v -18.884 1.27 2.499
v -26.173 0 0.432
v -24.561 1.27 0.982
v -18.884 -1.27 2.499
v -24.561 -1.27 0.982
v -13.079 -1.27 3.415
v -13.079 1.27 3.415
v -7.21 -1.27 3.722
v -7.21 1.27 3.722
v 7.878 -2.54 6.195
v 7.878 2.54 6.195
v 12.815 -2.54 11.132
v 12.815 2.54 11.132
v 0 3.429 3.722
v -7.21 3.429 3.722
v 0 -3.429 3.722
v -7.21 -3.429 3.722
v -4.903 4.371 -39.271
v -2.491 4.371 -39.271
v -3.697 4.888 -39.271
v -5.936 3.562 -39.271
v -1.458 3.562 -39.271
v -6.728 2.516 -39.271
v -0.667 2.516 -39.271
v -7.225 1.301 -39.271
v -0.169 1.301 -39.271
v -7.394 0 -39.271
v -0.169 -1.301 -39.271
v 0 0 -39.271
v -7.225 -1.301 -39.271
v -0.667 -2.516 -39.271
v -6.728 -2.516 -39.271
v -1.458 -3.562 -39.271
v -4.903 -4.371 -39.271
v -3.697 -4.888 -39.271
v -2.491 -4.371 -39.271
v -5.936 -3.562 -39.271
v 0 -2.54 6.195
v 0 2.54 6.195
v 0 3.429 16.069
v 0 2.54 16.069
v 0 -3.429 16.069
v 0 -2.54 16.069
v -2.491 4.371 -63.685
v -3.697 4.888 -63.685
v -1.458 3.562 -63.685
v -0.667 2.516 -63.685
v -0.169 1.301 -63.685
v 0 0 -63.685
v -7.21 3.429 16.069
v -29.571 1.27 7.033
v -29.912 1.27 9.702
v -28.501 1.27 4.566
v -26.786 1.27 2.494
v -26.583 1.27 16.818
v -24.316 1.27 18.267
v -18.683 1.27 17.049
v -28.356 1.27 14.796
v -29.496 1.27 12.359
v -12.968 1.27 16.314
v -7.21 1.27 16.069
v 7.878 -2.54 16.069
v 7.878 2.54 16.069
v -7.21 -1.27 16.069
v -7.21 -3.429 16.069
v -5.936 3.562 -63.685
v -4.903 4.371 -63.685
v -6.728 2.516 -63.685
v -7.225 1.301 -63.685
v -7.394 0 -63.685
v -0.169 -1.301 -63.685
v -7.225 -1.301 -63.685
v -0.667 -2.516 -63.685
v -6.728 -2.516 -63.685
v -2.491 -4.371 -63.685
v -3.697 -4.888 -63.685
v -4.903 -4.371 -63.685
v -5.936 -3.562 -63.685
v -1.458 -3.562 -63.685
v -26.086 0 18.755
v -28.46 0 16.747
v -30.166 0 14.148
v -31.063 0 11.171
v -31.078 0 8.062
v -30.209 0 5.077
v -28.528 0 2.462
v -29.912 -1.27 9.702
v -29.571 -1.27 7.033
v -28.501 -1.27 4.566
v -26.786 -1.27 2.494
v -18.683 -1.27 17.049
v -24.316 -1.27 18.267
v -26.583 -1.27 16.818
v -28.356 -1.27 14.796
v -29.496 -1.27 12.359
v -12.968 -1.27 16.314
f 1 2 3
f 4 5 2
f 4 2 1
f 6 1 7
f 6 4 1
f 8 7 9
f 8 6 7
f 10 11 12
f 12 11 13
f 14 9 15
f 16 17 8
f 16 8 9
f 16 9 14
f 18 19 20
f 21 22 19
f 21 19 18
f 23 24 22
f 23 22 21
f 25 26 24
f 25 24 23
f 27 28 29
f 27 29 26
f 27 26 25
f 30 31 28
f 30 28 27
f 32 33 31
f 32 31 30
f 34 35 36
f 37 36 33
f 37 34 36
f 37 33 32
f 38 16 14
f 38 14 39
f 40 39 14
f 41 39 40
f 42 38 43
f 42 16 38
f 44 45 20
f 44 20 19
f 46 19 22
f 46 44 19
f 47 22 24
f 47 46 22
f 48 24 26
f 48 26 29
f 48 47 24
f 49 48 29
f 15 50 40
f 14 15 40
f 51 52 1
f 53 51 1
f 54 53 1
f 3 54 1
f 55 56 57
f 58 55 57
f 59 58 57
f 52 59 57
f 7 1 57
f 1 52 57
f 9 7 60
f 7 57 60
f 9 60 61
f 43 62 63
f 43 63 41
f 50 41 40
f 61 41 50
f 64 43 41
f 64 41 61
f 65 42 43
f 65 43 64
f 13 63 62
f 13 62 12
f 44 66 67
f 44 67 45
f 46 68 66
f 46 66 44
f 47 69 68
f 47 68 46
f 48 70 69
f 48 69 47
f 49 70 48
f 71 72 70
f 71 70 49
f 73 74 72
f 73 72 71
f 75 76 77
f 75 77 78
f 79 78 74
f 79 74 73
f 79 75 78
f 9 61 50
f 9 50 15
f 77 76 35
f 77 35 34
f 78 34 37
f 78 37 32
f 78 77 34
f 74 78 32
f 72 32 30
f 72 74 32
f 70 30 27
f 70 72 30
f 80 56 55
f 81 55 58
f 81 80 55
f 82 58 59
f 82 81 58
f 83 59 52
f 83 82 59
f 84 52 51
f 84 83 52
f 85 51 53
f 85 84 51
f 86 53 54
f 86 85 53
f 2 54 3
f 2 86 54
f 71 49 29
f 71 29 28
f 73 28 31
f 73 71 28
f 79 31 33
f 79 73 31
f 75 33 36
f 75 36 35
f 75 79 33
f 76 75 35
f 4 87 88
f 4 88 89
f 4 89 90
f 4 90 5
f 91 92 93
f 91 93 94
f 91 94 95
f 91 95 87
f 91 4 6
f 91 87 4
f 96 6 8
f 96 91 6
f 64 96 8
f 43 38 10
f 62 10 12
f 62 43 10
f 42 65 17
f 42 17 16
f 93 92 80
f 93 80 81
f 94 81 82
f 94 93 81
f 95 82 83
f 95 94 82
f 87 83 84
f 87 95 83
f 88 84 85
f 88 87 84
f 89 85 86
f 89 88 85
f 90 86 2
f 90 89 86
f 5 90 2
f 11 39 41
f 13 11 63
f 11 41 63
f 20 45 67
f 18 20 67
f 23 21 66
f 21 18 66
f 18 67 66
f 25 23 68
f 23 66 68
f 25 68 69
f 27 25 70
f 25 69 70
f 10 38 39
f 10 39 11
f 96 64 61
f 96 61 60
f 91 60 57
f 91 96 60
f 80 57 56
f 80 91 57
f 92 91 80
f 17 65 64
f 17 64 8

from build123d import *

# Parameters (mm, degrees)
F2_DEPTH    = 5.08
F3_T1_DEPTH = 49.8149751961
F5_DEPTH    = 3.429
F6_DEPTH    = 1.27
F7_T2_ANGLE = 164.598317353
F7_T4_ANGLE = 164.598317353
F1_W        = 12.957720086
F1_H        = 9.8736736098
F8_DEPTH    = 2.54
F9_T1_DEPTH = 31.2082991577


# Not quite as in the source:
# - a fillet or chamfer that OpenCascade refuses, or shapes differently, is made with other operations: its cross-section is extruded or revolved along the edge and cut away or added
# - the program builds the solid bodies; features that only make, move or delete a surface that nothing else refers to are left out


with BuildPart() as f2:
    # F0 (on Front) → F2 (new body, symmetric)
    with BuildSketch(Plane.XZ):
        Polygon((-3.9172582328, -39.270516485), (-7.3943706229, -39.270516485), (-7.3943706229, -63.6854916811), (0, -63.6854916811), (0, -39.270516485), align=None)
    extrude(amount=F2_DEPTH, both=True)

    # F3: fillet of radius 5.08 on 4 edges, made by hand

    # F3_s2 → F3_t1 (cut)
    with BuildSketch(Plane.XY.offset(-76.3854916811)):
        with BuildLine():
            ThreePointArc((-2.3143706229, -5.08), (-5.9064730714, -3.5921024484), (-7.3943706229, 0))
            Line((-7.3943706229, 0), (-7.3943706229, -5.08))
            Line((-7.3943706229, -5.08), (-2.3143706229, -5.08))
        make_face()
        with BuildLine():
            ThreePointArc((0, 0), (-1.4878975516, -3.5921024484), (-5.08, -5.08))
            Line((-5.08, -5.08), (0, -5.08))
            Line((0, -5.08), (0, 0))
        make_face()
        with BuildLine():
            ThreePointArc((-5.08, 5.08), (-1.4878975516, 3.5921024484), (0, 0))
            Line((0, 0), (0, 5.08))
            Line((0, 5.08), (-5.08, 5.08))
        make_face()
        with BuildLine():
            ThreePointArc((-2.3143706229, 5.08), (-5.9064730714, 3.5921024484), (-7.3943706229, 0))
            Line((-7.3943706229, 0), (-7.3943706229, 5.08))
            Line((-7.3943706229, 5.08), (-2.3143706229, 5.08))
        make_face()
    extrude(amount=F3_T1_DEPTH, mode=Mode.SUBTRACT)


with BuildPart() as f5:
    # F1 (on Front) → F5 (new body, symmetric)
    with BuildSketch(Plane.XZ):
        Polygon((-7.210094016, 16.0689561734), (-7.210094016, 3.7220644299), (0, 3.7220644299), (0, 6.1952825636), (0, 16.0689561734), align=None)
    extrude(amount=F5_DEPTH, both=True)

    # F1 (on Front) → F6 (join, symmetric)
    with BuildSketch(Plane.XZ):
        with BuildLine():
            ThreePointArc((-27.3404738286, 0), (-17.4458885018, 2.7837284893), (-7.210094016, 3.7220644299))
            Line((-7.210094016, 3.7220644299), (-7.210094016, 16.0689561734))
            ThreePointArc((-7.210094016, 16.0689561734), (-17.3911666381, 16.8392039186), (-27.3404738286, 19.1324129701))
            ThreePointArc((-27.3404738286, 19.1324129701), (-32.1990065296, 9.566206485), (-27.3404738286, 0))
        make_face()
    extrude(amount=F6_DEPTH, both=True)

    # F7: chamfer of 2.286 on 2 edges, made by hand

    # F7_s1 → F7_t2 (revolve, cut)
    with BuildSketch(Plane(origin=(-18.7162873139, 0, -2.5308211801), x_dir=(0, 1, 0), z_dir=(0.9909812322, 0, 0.1340007369))):
        Polygon((1.016, 24.0540768802), (-1.27, 21.7680768802), (-1.27, 24.0540768802), align=None)
    revolve(axis=Axis((-20.3520505033, -1.27, 9.566206485), (0, -1, 0)), revolution_arc=F7_T2_ANGLE, mode=Mode.SUBTRACT)

    # F7_s3 → F7_t4 (revolve, cut)
    with BuildSketch(Plane(origin=(-18.7162873139, 0, -2.5308211801), x_dir=(0, 1, 0), z_dir=(0.9909812322, 0, 0.1340007369))):
        Polygon((1.27, 21.7680768802), (-1.016, 24.0540768802), (1.27, 24.0540768802), align=None)
    revolve(axis=Axis((-20.3520505033, 1.27, 9.566206485), (0, -1, 0)), revolution_arc=F7_T4_ANGLE, mode=Mode.SUBTRACT)

    # F1 (on Front) → F8 (join, symmetric)
    with BuildSketch(Plane.XZ):
        with Locations((6.478860043, 11.1321193685)):
            Rectangle(F1_W, F1_H)
    extrude(amount=F8_DEPTH, both=True)

    # F9: chamfer of 5.08 on 2 edges, made by hand

    # F9_s2 → F9_t1 (cut)
    with BuildSketch(Plane.XZ.offset(-15.6041495789)):
        Polygon((7.877720086, 16.0689561734), (12.957720086, 10.9889561734), (12.957720086, 16.0689561734), align=None)
        Polygon((7.877720086, 6.1952825636), (12.957720086, 11.2752825636), (12.957720086, 6.1952825636), align=None)
    extrude(amount=F9_T1_DEPTH, mode=Mode.SUBTRACT)


solid = Compound([f2.part, f5.part])
